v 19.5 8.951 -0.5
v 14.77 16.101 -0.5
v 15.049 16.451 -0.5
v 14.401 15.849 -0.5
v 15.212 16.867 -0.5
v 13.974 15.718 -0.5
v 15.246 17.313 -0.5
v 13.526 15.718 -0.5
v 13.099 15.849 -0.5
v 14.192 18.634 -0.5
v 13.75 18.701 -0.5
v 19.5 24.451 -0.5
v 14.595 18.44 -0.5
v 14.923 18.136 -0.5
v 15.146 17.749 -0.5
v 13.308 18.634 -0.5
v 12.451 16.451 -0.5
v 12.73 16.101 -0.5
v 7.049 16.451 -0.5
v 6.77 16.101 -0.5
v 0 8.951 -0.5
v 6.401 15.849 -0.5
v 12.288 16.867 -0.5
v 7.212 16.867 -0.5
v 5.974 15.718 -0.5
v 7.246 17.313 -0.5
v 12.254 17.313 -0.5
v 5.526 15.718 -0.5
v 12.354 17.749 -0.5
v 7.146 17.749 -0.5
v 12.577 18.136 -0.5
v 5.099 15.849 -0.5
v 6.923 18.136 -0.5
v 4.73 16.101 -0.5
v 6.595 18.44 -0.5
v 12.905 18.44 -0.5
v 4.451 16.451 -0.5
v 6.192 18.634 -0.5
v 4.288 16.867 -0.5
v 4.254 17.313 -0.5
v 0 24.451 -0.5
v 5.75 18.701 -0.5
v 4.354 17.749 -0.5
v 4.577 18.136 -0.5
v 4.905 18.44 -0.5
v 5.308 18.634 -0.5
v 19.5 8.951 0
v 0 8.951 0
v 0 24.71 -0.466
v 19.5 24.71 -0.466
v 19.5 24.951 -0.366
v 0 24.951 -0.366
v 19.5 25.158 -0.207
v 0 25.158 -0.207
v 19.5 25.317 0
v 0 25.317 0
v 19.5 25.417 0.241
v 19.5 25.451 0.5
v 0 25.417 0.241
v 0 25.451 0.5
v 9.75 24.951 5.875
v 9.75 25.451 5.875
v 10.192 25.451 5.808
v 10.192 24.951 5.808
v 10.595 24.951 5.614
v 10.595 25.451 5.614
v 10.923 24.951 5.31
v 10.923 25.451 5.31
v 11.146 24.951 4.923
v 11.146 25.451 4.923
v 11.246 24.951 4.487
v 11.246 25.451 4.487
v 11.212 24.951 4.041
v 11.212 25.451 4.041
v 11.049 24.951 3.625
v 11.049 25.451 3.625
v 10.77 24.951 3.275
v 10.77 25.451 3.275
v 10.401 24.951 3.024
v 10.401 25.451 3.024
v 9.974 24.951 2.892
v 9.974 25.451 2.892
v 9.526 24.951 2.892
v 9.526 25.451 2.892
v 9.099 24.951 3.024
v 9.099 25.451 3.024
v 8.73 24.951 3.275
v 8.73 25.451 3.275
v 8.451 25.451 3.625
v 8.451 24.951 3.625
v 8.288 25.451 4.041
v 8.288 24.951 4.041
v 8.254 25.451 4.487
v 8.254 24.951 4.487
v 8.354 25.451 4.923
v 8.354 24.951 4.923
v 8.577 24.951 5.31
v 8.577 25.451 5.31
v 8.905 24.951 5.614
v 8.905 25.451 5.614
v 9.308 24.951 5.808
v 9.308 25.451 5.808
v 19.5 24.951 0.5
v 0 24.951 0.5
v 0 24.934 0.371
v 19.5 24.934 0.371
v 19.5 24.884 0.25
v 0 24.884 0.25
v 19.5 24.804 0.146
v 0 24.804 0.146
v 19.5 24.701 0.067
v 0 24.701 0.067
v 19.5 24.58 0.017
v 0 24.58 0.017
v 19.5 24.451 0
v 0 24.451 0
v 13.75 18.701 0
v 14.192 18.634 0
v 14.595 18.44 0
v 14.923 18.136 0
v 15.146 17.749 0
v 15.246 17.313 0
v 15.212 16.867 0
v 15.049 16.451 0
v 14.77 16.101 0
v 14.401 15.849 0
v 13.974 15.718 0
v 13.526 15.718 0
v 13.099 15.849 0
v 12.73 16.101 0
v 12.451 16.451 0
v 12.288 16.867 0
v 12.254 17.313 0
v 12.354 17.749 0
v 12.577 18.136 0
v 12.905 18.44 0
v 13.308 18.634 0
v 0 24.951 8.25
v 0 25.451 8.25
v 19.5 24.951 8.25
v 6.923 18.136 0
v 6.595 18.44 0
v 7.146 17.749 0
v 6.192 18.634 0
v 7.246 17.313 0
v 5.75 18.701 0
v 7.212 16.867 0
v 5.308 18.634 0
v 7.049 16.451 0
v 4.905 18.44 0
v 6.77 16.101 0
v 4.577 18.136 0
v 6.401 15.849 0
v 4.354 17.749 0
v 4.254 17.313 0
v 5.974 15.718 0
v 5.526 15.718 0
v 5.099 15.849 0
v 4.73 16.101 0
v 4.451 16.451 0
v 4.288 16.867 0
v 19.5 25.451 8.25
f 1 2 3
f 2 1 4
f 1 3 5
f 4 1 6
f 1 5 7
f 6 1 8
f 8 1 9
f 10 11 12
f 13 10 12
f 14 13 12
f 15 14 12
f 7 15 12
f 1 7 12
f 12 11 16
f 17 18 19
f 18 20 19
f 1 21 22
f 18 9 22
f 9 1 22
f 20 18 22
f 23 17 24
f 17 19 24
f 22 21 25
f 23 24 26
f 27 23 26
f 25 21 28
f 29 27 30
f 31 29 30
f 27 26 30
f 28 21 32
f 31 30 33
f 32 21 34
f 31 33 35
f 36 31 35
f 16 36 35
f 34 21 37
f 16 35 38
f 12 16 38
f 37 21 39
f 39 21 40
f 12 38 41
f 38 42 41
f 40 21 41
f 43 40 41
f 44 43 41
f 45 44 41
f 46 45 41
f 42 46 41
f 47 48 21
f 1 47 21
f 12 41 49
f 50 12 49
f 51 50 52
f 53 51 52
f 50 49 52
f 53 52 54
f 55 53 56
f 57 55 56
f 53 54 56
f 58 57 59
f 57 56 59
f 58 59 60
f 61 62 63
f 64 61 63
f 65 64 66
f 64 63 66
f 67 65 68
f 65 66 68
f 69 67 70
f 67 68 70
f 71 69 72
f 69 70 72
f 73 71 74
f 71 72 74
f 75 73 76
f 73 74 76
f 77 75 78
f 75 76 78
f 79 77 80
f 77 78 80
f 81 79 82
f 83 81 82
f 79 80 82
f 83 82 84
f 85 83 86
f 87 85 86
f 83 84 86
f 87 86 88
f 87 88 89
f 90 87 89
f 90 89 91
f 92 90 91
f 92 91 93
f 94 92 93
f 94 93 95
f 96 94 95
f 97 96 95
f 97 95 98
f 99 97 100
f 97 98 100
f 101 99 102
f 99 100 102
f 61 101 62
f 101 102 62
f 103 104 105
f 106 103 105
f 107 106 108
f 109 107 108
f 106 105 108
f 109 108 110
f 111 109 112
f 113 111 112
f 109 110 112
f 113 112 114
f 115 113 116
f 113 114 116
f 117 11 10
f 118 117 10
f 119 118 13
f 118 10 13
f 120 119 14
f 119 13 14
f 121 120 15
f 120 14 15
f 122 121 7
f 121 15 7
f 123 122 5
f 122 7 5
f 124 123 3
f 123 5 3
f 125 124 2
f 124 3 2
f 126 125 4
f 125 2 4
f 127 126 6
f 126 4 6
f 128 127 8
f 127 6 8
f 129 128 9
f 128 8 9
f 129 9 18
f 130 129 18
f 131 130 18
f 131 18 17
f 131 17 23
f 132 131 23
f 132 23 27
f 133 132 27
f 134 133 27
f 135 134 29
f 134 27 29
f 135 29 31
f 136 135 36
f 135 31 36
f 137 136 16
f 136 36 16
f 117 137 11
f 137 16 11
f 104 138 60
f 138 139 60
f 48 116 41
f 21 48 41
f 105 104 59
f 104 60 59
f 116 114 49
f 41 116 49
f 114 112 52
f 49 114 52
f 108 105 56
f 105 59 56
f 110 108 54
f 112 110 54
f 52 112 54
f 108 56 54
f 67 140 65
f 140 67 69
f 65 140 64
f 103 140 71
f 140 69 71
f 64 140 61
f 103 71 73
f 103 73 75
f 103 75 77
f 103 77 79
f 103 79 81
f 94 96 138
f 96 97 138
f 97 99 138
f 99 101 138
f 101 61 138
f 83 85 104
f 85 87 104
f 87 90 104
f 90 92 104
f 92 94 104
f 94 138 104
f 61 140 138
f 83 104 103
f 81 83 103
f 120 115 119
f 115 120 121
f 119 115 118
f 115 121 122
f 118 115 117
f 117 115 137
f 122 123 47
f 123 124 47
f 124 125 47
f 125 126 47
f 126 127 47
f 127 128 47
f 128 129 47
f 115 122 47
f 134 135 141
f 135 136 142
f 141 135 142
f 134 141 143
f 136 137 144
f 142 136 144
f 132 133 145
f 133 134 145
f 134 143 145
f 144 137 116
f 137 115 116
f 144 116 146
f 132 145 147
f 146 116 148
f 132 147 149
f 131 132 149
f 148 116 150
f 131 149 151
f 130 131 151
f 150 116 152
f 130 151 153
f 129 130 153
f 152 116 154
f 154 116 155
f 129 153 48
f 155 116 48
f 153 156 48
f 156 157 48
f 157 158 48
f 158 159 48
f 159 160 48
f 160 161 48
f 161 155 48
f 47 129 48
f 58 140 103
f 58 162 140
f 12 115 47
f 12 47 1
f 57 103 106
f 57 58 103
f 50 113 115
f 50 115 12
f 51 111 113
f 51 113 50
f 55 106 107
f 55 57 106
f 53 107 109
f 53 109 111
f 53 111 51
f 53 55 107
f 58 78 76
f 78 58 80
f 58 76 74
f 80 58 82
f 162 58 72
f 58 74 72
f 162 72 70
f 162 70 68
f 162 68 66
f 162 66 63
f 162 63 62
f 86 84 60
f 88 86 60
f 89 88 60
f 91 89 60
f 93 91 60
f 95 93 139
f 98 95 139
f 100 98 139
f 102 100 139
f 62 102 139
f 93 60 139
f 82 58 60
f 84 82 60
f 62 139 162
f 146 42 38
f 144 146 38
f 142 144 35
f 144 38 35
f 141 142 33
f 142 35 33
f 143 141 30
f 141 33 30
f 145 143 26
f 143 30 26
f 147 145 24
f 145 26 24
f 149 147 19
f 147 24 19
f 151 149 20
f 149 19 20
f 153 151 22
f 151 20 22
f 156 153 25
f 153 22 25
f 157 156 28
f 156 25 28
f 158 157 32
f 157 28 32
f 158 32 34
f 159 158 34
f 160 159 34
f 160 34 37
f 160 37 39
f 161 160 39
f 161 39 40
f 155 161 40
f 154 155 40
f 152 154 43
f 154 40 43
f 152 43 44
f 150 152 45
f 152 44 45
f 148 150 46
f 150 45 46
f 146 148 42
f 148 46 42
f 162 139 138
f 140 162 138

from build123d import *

# Parameters (mm, degrees)
BRIDA_BASE1_DEPTH     = 19.5
CROQUIS9_R            = 1.5
CORTAR_EXTRUIR4_DEPTH = 0.5
CROQUIS10_R           = 1.5
CORTAR_EXTRUIR5_DEPTH = 0.5


# Sheet-metal steps are written as plain solids
with BuildPart() as part:
    # Croquis1 → Brida base1 (new body)
    with BuildSketch(Plane(origin=(0, 0, 0), x_dir=(0, 0, -1), z_dir=(1, 0, 0))):
        with BuildLine():
            Line((-8.25, 24.950879865), (-0.5, 24.950879865))
            ThreePointArc((-0.5, 24.950879865), (-0.146446609, 24.804433255), (0, 24.450879865))
            Line((0, 24.450879865), (0, 8.950879865))
            Line((0, 8.950879865), (0.5, 8.950879865))
            Line((0.5, 8.950879865), (0.5, 24.450879865))
            ThreePointArc((0.5, 24.450879865), (0.207106781, 25.157986646), (-0.5, 25.450879865))
            Line((-0.5, 25.450879865), (-8.25, 25.450879865))
            Line((-8.25, 25.450879865), (-8.25, 24.950879865))
        make_face()
    extrude(amount=BRIDA_BASE1_DEPTH)

    # Croquis9 → Cortar-Extruir4 (cut)
    with BuildSketch(Plane(origin=(0, 0, -0.5), x_dir=(-1, 0, 0), z_dir=(0, 0, -1))):
        with Locations(Location((-13.75, 17.200879865, 0), (0, 0, 90))):
            Circle(CROQUIS9_R)
        with Locations(Location((-5.75, 17.200879865, 0), (0, 0, 90))):
            Circle(CROQUIS9_R)
    extrude(amount=-CORTAR_EXTRUIR4_DEPTH, mode=Mode.SUBTRACT)

    # Croquis10 → Cortar-Extruir5 (cut)
    with BuildSketch(Plane(origin=(0, 25.450879865, 0), x_dir=(1, 0, 0), z_dir=(0, 1, 0))):
        with Locations(Location((9.75, -4.375, 0), (0, 0, 270))):
            Circle(CROQUIS10_R)
    extrude(amount=-CORTAR_EXTRUIR5_DEPTH, mode=Mode.SUBTRACT)


solid = part.part
